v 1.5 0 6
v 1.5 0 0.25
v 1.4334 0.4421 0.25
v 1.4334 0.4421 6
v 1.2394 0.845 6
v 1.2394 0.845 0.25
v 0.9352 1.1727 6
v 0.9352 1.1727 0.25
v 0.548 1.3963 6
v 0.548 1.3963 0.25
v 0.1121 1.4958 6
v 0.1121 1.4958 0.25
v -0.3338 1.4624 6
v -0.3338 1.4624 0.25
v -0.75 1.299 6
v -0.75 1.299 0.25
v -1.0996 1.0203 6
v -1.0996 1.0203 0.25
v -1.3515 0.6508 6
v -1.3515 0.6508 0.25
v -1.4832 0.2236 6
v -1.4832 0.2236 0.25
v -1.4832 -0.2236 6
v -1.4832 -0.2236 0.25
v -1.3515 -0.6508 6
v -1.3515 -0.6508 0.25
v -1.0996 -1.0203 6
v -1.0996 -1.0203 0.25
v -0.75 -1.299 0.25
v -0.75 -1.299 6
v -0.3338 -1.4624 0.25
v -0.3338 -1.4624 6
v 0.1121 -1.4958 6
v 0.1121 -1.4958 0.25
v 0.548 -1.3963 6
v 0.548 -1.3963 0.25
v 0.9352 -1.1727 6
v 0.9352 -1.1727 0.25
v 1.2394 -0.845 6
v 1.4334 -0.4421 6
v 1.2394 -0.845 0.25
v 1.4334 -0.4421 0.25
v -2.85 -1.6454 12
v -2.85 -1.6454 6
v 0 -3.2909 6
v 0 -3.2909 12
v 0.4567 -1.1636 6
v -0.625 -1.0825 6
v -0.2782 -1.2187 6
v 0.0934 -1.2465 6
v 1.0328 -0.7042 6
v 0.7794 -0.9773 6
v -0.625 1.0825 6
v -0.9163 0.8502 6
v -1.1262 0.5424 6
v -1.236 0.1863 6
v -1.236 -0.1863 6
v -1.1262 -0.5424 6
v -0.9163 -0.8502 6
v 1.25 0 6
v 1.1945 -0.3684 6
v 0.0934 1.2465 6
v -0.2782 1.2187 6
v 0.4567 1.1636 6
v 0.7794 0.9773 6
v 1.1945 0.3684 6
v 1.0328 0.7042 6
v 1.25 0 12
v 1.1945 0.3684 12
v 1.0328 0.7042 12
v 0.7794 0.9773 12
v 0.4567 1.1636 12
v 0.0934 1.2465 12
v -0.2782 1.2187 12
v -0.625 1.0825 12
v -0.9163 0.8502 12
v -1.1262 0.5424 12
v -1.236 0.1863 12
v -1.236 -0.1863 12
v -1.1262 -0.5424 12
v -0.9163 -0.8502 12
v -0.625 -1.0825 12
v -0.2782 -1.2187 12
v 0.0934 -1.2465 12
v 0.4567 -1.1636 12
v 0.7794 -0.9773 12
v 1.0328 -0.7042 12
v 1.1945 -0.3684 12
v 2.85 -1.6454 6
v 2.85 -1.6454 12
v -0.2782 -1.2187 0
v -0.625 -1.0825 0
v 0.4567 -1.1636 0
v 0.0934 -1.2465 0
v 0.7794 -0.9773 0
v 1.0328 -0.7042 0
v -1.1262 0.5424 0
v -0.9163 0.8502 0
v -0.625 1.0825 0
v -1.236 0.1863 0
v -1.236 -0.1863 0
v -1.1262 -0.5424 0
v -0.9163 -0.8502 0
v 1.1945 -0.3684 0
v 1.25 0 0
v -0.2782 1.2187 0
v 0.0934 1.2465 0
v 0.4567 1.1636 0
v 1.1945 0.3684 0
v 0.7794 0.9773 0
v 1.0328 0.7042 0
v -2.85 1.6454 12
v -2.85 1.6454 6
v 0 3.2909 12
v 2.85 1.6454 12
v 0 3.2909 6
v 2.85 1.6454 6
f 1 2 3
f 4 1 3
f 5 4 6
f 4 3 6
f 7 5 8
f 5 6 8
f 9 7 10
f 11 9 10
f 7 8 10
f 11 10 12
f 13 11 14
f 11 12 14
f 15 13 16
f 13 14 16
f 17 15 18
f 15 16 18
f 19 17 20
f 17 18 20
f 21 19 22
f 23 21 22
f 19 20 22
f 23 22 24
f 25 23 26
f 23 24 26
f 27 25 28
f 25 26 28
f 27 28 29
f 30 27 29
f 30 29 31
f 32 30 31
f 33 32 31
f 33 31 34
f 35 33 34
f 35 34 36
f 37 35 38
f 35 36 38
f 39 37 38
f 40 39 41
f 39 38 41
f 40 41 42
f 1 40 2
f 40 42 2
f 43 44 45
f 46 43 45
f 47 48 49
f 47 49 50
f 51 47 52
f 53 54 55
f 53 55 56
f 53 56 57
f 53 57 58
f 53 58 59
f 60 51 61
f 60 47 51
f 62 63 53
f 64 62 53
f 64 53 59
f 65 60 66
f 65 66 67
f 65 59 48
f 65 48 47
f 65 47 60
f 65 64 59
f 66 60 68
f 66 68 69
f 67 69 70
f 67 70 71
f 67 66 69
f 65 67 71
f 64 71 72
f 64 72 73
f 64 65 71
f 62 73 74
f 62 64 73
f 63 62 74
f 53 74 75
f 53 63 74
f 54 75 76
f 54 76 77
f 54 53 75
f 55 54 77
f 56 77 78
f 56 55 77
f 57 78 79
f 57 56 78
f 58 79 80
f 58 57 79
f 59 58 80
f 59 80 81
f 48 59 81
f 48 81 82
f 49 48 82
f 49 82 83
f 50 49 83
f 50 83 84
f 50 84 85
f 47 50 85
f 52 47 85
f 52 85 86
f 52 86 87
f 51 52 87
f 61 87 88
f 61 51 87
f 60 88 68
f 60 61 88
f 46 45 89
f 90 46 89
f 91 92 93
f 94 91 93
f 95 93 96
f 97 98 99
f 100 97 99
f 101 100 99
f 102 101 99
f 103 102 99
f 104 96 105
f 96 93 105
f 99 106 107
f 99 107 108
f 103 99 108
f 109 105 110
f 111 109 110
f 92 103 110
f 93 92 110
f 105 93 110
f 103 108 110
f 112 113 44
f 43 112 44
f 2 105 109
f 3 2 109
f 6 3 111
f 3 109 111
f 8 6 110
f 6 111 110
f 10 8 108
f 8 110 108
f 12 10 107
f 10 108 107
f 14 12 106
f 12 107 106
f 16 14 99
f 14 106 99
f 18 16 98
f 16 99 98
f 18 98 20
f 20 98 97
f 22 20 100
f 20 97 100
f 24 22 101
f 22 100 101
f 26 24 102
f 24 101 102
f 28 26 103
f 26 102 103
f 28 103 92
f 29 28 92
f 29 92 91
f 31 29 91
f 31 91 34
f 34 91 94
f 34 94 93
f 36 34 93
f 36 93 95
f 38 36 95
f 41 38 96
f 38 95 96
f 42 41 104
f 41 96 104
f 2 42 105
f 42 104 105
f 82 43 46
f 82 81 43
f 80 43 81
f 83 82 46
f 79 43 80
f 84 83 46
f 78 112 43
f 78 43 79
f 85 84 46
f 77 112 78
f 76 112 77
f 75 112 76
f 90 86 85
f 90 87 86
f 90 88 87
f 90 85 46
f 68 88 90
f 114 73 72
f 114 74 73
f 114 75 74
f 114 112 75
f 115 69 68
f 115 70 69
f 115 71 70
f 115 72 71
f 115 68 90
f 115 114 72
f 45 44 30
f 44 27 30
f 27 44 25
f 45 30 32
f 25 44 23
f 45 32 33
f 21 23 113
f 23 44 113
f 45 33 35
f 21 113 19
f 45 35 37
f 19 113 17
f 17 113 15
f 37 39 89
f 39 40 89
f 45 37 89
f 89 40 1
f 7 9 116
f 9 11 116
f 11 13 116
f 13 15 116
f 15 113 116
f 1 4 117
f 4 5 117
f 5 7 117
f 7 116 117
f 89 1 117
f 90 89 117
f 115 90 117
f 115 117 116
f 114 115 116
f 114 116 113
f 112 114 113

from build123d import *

# Parameters (mm, degrees)
SKETCH_R     = 1.5
PAD_DEPTH    = 6
SKETCH001_R  = 1.25
PAD001_DEPTH = 6
CHAMFER_SIZE = 0.25


with BuildPart() as part:
    # Sketch → Pad (new body)
    with BuildSketch(Plane.XY):
        Circle(SKETCH_R)
    extrude(amount=PAD_DEPTH)

    # Sketch001 (on Face3 of Pad) → Pad001 (join)
    with BuildSketch(Plane.XY.offset(6)):
        Polygon((0, -3.290897), (2.85, -1.645448), (2.85, 1.645448), (0, 3.290897), (-2.85, 1.645448), (-2.85, -1.645448), align=None)
        Circle(SKETCH001_R, mode=Mode.SUBTRACT)
    extrude(amount=PAD001_DEPTH)

    # Chamfer
    chamfer_edges = [part.edges().sort_by_distance(p)[0] for p in [
        (-1.5, 0, 0),
    ]]
    chamfer(chamfer_edges, length=CHAMFER_SIZE)


solid = part.part
